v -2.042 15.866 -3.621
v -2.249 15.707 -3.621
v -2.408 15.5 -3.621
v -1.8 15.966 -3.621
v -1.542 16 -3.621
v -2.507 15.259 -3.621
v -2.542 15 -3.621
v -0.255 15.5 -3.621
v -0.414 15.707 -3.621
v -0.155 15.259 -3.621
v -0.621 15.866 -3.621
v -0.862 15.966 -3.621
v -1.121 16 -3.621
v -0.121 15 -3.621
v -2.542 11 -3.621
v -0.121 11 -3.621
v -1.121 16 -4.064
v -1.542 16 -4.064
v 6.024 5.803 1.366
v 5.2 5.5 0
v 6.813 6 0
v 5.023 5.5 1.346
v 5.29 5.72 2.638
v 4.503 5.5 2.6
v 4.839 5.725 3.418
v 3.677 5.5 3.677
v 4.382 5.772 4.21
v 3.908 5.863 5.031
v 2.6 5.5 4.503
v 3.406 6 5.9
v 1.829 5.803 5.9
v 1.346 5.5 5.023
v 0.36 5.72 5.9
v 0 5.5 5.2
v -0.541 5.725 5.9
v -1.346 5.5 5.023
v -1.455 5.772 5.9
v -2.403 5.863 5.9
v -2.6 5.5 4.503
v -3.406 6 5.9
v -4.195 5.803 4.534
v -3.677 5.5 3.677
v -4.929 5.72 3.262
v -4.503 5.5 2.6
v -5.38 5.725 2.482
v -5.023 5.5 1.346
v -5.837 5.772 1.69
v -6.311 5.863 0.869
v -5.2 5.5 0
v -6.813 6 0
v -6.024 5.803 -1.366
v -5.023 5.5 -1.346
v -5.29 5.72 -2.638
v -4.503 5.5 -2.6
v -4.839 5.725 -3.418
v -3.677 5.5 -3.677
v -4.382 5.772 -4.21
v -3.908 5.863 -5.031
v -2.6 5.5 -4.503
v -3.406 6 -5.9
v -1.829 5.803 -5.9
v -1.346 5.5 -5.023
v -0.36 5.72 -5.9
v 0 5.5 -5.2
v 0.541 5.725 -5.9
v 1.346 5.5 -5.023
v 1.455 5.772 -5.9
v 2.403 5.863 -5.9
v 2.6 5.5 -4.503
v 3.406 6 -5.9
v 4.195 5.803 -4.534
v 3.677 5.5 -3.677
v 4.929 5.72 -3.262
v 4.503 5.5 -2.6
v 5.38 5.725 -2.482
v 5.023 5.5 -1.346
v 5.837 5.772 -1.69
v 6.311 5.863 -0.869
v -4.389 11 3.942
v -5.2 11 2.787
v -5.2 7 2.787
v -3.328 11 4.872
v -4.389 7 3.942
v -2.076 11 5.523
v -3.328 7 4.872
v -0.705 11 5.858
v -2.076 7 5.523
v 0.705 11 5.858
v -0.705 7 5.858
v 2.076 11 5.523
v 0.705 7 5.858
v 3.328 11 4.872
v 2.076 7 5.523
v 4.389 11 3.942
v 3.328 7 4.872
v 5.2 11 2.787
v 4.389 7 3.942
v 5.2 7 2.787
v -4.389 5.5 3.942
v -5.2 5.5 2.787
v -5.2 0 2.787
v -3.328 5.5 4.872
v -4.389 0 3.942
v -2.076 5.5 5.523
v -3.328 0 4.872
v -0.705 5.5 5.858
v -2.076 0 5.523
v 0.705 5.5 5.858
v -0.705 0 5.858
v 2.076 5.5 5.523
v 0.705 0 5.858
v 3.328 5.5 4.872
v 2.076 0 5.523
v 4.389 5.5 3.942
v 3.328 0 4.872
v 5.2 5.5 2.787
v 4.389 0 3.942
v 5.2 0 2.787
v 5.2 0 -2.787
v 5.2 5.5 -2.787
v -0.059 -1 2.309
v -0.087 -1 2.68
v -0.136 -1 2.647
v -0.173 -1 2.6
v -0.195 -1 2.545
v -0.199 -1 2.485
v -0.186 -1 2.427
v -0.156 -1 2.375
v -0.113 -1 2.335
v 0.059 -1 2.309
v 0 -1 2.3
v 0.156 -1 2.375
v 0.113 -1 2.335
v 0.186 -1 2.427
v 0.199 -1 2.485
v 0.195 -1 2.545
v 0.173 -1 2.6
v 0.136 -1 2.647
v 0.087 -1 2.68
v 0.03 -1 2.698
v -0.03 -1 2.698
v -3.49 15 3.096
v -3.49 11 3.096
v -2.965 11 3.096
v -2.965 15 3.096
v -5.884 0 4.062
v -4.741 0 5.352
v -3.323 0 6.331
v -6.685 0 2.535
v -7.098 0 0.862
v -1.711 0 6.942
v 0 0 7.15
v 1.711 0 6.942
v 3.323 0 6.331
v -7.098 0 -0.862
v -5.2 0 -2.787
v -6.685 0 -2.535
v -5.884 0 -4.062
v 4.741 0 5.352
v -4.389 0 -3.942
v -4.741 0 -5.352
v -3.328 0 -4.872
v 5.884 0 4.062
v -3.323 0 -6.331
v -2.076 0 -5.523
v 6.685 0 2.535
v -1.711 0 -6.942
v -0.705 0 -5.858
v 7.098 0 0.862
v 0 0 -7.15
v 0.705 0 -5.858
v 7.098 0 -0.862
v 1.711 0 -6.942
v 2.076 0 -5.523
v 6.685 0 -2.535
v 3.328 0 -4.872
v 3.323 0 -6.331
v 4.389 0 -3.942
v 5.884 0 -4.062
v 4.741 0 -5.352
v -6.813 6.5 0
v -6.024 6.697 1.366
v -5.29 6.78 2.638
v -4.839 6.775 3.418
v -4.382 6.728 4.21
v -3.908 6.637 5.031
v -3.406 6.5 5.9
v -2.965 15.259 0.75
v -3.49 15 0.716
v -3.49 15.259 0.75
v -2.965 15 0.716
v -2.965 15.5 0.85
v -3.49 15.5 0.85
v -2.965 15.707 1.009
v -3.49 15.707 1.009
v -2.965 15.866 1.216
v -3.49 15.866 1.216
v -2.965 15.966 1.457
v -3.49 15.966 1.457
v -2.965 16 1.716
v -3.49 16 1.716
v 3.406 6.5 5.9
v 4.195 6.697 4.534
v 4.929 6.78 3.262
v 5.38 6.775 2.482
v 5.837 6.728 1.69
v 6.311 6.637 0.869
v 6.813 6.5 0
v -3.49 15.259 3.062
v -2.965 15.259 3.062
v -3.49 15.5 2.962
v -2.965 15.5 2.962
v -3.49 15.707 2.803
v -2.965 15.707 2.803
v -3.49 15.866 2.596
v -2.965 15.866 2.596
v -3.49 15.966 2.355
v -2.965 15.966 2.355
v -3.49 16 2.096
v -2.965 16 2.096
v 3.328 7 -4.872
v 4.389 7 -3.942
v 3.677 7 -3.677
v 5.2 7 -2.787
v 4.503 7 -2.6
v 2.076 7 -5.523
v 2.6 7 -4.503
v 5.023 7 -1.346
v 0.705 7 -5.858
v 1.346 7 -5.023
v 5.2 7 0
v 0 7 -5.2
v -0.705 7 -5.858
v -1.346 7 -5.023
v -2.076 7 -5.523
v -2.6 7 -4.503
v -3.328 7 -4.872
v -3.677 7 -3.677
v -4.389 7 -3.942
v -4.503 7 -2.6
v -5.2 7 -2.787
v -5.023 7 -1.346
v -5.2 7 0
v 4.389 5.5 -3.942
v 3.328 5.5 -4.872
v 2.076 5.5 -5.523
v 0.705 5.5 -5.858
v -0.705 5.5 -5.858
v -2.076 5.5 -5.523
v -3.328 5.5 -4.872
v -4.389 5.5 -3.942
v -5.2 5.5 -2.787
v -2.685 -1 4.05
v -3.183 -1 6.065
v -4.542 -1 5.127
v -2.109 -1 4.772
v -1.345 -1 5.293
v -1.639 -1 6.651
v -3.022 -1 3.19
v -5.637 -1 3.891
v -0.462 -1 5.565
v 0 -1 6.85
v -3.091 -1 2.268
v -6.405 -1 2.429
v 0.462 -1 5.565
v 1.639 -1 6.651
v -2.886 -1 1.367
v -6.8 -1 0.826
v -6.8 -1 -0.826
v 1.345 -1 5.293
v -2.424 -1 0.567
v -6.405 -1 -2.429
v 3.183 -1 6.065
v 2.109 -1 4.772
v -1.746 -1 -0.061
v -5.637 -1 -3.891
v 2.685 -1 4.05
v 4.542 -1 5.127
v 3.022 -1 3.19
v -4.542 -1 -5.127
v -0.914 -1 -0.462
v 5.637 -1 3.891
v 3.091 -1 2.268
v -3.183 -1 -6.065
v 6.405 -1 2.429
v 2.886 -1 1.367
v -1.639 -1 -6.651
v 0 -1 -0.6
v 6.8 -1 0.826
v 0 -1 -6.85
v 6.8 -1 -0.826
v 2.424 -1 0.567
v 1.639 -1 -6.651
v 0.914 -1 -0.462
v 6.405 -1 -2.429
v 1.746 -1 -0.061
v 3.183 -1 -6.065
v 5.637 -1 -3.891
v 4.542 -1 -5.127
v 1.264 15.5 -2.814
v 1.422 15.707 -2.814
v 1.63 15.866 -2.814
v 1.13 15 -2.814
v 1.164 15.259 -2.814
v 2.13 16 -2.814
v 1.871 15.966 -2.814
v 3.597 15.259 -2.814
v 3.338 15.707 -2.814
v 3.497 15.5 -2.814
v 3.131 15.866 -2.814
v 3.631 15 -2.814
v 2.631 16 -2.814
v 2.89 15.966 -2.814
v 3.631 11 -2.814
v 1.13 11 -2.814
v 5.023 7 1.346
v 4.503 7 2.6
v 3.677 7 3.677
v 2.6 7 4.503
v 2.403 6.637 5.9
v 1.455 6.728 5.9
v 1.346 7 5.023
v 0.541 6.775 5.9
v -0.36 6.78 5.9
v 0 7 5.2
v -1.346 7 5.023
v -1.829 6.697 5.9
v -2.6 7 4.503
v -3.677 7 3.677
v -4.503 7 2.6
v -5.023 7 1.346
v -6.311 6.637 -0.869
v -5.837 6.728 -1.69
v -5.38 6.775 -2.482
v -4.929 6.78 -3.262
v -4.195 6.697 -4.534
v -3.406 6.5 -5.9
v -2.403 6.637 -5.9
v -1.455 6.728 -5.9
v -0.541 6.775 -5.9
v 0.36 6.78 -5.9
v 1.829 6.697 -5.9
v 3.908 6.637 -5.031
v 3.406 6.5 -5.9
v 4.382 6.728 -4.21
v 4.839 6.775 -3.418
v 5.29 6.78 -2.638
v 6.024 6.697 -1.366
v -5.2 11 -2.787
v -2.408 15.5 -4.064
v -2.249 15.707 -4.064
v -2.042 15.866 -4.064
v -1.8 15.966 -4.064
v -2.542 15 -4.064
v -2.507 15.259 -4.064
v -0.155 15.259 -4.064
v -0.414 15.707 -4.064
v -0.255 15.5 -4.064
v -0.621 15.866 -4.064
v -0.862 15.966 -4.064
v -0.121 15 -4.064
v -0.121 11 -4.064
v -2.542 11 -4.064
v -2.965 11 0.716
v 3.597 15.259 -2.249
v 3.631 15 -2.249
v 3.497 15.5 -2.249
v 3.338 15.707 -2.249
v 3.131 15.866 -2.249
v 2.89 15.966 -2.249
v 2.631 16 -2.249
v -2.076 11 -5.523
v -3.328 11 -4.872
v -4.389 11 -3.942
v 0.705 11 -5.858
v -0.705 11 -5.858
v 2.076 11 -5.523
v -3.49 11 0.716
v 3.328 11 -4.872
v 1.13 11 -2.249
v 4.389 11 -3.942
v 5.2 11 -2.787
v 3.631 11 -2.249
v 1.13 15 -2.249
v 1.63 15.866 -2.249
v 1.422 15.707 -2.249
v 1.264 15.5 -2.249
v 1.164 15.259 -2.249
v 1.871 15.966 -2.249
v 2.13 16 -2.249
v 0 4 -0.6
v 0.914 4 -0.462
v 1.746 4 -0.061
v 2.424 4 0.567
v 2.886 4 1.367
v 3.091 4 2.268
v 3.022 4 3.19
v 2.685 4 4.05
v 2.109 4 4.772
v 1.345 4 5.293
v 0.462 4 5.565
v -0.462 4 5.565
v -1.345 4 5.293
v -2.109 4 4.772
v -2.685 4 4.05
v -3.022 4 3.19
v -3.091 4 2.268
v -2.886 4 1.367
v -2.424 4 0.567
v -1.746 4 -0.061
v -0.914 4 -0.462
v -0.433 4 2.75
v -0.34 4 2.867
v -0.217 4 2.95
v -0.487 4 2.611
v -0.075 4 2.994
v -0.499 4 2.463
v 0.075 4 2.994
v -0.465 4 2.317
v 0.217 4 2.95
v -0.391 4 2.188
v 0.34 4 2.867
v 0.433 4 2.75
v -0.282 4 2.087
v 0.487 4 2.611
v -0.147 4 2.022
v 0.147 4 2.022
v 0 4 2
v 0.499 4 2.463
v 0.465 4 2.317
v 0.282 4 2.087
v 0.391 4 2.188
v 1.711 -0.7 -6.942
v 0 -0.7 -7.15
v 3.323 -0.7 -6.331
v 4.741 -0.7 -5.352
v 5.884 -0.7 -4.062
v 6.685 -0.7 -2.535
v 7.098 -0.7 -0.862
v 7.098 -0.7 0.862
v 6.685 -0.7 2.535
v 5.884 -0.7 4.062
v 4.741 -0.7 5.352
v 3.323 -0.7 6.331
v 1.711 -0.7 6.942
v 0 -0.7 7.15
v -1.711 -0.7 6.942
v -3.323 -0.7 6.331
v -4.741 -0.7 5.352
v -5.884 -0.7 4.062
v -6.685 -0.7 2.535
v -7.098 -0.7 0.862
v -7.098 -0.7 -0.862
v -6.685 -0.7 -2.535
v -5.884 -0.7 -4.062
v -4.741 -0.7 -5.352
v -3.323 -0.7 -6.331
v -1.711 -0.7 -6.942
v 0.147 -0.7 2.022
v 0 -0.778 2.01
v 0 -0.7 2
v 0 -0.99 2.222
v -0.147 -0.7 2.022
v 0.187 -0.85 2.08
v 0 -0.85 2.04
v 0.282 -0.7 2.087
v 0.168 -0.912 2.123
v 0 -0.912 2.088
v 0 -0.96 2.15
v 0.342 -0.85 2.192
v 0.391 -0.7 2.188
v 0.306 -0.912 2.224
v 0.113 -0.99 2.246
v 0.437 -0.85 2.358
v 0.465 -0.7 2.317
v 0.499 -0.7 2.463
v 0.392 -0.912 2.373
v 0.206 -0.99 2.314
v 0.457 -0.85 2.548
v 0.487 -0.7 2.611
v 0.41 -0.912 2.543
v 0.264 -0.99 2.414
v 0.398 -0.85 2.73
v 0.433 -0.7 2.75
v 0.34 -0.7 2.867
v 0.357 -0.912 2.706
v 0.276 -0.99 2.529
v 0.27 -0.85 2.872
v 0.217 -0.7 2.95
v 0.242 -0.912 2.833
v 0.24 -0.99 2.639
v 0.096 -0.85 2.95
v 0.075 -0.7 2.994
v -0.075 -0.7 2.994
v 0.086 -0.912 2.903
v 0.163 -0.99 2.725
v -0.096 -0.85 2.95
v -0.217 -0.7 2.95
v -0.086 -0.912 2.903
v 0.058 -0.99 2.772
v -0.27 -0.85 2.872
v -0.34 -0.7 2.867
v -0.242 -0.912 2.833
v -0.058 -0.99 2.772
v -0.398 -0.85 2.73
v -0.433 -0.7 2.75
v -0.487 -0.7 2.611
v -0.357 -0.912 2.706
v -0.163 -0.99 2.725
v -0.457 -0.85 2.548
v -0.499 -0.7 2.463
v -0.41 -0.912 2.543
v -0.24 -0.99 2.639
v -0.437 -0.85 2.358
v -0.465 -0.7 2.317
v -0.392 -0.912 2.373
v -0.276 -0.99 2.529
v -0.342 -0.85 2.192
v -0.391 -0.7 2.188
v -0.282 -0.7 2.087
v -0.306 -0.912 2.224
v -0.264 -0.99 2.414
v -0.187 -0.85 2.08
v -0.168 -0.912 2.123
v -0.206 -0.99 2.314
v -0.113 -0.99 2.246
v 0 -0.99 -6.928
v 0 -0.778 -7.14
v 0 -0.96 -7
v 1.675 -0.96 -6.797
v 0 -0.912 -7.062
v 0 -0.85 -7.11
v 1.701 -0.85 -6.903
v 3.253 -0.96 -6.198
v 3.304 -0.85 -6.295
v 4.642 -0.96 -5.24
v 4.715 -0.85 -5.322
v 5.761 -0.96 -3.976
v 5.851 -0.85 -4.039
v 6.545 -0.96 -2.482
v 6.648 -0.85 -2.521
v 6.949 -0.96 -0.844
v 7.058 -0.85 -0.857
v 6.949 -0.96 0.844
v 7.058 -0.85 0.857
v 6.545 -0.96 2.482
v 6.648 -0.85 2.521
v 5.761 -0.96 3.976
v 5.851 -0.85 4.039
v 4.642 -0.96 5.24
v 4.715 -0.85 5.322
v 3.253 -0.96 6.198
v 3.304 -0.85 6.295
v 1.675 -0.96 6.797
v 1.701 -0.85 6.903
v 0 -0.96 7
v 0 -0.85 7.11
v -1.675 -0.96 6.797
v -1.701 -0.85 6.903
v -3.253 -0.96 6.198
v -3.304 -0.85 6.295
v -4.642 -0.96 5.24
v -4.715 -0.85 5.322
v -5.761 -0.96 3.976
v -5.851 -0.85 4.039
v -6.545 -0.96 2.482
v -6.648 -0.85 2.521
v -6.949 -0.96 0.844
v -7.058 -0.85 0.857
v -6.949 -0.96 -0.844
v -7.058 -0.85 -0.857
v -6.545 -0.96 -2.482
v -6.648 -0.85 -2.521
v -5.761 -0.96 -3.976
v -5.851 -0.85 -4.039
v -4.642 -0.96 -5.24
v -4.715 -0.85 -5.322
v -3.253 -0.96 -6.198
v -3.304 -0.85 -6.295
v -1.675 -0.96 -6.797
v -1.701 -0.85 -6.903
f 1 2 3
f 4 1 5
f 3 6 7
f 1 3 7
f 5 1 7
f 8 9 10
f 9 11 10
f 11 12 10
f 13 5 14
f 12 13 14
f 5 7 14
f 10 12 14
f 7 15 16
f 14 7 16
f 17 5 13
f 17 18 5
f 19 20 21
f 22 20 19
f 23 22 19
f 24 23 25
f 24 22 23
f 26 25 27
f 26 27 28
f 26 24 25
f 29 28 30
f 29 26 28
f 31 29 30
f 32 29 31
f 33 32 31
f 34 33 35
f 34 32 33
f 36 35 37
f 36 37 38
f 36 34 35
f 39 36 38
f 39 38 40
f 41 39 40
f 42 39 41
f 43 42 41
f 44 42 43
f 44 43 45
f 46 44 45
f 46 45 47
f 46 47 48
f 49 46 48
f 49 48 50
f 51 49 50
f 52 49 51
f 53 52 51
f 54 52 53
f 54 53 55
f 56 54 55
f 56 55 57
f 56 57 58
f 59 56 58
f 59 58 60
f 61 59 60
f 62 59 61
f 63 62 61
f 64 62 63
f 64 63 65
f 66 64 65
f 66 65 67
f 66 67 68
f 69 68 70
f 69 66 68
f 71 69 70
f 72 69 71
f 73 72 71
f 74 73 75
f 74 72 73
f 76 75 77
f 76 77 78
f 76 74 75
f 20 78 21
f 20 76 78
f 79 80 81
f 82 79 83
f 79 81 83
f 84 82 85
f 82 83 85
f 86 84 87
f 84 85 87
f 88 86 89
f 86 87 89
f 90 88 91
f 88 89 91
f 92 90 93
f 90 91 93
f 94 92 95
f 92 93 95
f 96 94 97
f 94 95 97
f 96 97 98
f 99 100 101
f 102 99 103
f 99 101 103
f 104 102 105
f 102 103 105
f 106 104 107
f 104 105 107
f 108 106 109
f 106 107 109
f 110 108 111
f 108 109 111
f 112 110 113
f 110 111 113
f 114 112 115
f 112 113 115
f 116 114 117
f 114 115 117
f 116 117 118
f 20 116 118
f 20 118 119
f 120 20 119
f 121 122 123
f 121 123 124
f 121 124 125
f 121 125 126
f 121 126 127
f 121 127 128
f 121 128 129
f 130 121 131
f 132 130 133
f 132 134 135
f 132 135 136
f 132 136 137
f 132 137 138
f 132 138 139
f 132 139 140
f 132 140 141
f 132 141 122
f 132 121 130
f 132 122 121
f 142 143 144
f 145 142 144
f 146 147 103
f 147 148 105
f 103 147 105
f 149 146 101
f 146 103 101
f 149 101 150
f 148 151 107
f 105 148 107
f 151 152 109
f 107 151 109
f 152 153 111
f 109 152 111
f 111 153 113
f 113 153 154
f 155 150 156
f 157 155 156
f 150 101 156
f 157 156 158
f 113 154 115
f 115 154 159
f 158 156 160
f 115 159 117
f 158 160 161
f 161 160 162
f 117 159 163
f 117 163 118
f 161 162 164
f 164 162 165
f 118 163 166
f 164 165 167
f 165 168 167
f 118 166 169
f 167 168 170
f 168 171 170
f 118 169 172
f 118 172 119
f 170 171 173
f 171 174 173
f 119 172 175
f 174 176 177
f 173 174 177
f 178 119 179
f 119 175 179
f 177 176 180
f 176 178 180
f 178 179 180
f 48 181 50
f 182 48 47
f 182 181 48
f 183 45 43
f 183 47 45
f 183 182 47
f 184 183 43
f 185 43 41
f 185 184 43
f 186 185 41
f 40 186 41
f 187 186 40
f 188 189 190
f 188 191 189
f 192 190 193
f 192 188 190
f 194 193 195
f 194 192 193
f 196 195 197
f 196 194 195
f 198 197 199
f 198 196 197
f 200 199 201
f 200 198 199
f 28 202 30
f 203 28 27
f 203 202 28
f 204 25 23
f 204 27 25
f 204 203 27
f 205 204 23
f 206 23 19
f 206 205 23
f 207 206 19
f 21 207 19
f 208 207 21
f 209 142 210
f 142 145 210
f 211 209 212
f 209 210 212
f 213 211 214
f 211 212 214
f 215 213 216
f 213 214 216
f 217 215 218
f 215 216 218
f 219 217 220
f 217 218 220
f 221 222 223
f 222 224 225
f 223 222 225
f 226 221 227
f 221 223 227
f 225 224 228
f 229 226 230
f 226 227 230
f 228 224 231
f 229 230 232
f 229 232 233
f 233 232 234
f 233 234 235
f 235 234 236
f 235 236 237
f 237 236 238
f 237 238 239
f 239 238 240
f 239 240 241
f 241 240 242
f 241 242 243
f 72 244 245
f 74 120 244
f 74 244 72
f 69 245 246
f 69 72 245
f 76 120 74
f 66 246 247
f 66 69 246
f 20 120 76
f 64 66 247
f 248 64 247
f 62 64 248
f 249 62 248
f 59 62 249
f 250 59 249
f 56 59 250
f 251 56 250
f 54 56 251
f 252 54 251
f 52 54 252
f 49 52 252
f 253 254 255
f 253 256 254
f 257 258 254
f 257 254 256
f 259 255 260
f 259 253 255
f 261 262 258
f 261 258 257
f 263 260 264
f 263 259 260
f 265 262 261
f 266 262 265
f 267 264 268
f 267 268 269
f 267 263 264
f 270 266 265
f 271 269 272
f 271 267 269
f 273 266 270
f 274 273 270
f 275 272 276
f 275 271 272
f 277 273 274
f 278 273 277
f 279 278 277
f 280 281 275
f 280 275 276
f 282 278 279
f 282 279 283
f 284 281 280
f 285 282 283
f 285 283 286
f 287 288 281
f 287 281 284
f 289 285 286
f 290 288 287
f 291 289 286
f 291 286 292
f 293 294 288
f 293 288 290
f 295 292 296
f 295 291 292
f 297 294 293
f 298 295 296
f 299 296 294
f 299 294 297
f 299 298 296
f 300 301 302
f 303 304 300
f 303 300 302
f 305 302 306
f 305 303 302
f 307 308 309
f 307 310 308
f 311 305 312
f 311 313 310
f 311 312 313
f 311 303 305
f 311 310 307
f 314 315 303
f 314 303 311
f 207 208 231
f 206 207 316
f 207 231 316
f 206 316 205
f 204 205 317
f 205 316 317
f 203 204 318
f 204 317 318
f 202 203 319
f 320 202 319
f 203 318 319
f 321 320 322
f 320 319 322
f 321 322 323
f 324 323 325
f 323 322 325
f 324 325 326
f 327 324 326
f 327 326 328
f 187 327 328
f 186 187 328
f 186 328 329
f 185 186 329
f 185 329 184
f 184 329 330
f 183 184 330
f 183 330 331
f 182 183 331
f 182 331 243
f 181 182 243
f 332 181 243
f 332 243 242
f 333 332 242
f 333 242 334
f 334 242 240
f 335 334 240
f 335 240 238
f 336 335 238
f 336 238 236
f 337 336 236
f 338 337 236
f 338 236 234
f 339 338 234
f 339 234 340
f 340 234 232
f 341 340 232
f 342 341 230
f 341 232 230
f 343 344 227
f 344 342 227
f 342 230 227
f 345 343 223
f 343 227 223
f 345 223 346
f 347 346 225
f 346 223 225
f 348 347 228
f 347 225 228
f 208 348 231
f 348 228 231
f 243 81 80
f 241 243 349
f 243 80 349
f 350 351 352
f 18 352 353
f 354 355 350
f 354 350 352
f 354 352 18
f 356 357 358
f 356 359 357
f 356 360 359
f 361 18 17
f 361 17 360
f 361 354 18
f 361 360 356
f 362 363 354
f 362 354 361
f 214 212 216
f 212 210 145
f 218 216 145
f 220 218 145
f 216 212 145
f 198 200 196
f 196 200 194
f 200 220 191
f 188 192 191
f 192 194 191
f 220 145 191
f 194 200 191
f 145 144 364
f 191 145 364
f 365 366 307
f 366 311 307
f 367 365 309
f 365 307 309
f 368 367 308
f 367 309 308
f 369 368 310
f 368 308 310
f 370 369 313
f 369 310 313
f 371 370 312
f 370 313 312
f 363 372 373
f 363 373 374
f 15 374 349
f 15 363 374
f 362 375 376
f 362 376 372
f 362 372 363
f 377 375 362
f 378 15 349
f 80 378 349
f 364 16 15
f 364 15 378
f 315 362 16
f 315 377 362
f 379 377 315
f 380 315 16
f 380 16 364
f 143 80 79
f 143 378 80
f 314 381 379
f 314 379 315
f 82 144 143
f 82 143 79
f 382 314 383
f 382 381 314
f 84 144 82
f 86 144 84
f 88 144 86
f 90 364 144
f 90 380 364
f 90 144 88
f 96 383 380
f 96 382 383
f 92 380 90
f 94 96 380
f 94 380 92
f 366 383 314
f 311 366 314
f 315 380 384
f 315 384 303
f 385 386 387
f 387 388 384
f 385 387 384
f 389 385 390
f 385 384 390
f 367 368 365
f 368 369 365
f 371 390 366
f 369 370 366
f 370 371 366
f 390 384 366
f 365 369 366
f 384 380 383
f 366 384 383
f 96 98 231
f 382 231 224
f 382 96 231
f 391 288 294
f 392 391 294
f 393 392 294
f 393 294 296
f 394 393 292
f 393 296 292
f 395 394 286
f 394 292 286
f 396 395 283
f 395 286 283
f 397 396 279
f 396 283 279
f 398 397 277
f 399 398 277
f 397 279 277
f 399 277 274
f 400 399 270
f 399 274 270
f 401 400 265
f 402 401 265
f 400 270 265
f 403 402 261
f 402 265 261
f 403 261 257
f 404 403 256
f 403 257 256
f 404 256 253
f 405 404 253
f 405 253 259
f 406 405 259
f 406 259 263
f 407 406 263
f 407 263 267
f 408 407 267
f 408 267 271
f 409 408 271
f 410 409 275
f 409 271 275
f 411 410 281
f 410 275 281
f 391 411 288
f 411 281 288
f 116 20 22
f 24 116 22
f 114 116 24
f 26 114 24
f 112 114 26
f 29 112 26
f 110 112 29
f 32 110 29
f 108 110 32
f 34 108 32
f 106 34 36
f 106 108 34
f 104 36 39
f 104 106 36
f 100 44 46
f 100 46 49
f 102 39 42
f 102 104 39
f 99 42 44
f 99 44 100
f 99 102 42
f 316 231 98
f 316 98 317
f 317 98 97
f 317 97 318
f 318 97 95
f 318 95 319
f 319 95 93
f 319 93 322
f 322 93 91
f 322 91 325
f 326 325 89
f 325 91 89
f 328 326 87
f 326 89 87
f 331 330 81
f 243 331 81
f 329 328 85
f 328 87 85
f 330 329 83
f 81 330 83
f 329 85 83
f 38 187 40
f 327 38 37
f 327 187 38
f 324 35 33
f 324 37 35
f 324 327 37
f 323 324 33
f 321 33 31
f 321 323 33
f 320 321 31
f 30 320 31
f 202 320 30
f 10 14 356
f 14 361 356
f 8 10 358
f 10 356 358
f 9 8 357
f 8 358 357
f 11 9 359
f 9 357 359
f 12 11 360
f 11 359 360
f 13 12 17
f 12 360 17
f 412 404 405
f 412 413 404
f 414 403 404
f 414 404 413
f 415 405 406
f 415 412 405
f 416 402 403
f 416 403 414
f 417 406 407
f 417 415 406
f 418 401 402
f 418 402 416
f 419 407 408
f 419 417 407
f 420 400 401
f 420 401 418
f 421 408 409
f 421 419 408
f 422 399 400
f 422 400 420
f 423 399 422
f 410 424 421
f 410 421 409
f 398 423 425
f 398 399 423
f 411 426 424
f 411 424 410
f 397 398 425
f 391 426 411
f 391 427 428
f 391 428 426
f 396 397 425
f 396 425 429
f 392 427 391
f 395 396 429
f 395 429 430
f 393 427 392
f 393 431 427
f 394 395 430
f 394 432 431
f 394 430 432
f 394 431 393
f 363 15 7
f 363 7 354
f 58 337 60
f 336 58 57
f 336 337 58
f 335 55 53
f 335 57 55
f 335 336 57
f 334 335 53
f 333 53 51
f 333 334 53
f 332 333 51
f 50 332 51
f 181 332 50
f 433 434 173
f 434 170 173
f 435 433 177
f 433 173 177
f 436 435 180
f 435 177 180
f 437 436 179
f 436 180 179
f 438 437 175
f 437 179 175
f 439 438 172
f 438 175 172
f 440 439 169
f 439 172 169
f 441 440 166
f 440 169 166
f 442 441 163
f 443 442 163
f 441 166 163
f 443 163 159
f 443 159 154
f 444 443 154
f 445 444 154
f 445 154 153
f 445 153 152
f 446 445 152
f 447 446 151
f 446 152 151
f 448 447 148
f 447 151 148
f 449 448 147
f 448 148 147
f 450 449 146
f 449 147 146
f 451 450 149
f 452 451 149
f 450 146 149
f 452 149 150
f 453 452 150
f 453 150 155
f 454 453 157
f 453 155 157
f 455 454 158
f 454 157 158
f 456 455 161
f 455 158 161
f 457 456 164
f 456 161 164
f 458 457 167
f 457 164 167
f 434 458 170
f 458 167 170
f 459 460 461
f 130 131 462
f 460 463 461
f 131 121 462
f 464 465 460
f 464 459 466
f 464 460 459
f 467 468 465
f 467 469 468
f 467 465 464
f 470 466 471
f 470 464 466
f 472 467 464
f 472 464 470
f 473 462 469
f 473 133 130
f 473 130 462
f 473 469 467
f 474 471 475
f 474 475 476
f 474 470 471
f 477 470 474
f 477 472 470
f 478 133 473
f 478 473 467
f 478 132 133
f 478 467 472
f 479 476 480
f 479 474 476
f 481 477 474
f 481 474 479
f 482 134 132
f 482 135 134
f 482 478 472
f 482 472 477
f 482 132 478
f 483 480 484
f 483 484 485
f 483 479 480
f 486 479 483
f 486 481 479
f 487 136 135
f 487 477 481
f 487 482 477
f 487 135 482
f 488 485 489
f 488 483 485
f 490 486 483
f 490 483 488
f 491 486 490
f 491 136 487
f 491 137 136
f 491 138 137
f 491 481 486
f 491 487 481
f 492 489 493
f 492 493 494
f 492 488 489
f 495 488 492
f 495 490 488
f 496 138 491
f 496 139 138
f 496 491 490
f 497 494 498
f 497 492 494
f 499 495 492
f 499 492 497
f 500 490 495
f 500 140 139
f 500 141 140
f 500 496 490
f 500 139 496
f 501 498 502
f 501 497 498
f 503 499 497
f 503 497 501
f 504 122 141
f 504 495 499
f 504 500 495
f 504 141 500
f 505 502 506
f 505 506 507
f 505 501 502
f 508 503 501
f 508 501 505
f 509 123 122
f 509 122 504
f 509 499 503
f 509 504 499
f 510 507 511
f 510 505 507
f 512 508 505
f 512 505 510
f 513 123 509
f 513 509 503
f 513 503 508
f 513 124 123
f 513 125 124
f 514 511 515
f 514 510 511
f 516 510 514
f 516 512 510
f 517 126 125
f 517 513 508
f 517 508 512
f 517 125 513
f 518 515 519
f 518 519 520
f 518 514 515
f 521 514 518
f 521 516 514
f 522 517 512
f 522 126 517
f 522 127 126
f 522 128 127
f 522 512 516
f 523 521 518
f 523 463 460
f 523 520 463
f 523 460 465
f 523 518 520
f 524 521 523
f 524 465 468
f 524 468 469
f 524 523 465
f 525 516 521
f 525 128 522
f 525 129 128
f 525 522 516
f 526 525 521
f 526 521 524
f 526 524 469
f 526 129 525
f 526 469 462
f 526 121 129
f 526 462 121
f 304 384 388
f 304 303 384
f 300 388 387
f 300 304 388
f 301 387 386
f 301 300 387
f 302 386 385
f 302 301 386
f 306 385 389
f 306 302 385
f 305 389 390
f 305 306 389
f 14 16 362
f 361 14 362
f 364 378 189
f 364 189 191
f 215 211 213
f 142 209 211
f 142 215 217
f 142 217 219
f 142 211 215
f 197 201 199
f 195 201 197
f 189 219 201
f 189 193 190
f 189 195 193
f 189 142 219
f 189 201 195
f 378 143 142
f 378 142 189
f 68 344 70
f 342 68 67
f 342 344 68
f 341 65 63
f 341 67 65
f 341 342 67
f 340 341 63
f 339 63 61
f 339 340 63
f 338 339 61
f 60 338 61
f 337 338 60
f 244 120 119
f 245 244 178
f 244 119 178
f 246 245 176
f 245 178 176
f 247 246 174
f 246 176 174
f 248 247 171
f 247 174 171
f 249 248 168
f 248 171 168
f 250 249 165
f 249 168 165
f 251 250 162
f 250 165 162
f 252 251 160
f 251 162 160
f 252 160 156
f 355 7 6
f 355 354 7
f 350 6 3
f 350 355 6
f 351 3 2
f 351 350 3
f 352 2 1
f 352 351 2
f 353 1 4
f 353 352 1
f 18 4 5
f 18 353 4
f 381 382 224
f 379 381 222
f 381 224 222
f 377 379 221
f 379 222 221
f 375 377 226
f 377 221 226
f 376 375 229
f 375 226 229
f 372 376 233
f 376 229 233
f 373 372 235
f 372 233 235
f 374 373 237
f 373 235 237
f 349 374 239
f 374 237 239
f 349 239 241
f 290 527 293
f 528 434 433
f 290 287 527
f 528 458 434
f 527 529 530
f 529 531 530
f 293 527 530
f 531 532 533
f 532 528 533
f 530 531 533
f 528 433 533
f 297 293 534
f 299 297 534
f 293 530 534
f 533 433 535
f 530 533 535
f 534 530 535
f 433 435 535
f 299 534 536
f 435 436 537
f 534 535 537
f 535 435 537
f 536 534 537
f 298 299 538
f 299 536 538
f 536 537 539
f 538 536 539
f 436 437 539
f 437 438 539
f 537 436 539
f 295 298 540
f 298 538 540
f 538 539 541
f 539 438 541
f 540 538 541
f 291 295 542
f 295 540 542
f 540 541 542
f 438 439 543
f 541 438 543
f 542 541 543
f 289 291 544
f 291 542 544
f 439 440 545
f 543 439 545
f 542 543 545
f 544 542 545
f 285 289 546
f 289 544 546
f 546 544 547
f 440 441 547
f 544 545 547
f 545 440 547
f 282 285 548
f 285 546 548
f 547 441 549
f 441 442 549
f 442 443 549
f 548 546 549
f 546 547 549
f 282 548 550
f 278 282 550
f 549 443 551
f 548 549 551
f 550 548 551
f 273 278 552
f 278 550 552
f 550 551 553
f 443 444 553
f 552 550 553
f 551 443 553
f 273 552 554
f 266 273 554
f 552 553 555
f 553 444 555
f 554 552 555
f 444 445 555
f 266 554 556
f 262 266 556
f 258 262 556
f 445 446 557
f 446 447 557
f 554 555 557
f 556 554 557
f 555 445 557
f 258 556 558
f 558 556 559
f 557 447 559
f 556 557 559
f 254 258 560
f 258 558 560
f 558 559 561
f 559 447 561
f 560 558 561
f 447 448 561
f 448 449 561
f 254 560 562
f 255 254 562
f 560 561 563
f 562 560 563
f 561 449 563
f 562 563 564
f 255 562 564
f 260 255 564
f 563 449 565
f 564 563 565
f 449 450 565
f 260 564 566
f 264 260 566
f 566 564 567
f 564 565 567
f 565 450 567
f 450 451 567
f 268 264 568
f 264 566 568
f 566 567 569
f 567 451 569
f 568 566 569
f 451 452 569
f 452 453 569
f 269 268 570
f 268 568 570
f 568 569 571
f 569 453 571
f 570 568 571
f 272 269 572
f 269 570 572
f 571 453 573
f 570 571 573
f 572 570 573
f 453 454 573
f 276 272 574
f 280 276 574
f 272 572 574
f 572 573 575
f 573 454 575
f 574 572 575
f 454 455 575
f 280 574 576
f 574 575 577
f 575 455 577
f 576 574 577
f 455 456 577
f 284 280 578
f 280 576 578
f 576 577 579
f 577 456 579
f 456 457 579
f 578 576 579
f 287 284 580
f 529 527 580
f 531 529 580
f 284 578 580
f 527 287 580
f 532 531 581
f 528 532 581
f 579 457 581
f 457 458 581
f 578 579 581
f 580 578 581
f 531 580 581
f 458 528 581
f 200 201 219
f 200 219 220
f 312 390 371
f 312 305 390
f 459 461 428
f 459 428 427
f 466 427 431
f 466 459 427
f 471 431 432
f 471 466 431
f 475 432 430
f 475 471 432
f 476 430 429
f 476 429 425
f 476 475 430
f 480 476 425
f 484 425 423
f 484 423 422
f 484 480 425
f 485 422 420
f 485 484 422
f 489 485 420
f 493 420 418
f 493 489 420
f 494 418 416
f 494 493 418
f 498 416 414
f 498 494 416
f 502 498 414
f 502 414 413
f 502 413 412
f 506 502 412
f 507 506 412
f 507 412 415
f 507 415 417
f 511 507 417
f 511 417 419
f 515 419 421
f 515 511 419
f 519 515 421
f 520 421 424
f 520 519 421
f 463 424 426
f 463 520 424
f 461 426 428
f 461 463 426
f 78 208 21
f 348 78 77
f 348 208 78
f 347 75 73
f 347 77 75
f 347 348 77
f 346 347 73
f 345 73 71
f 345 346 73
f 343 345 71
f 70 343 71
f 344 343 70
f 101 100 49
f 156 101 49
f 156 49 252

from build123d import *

# Parameters (mm, degrees)
SKETCH_2_R          = 5.9
EXTRUDE_1_DEPTH     = 11
SKETCH_3_R          = 7.15
EXTRUDE_2_DEPTH     = 1
SKETCH_4_R          = 3.1
SKETCH_4_R_2        = 0.5
CUT_EXTRUDE_1_DEPTH = 5
FILLET_1_R          = 0.3
FILLET_2_R          = 0.3
SKETCH_5_W          = 16.4
SKETCH_5_H          = 21
SKETCH_5_W_2        = 10.4
SKETCH_5_H_2        = 15
CUT_EXTRUDE_2_DEPTH = 11
SKETCH_6_W          = 2.420538387
SKETCH_6_H          = 0.443765371
SKETCH_6_W_2        = 2.501222999
SKETCH_6_H_2        = 0.56479229
SKETCH_6_W_3        = 0.524449984
SKETCH_6_H_3        = 2.38019608
EXTRUDE_3_DEPTH     = 5
FILLET_3_R          = 1
EXTRUDE_START       = -4
EXTRUDE_4_DEPTH     = 1.5


with BuildPart() as part:
    # 草图2 → 凸台-拉伸1 (new body)
    with BuildSketch(Plane(origin=(0, 0, 0), x_dir=(1, 0, 0), z_dir=(0, 1, 0))):
        with Locations(Location((0, 0, 0), (0, 0, 270))):
            Circle(SKETCH_2_R)
    extrude(amount=EXTRUDE_1_DEPTH)

    # 草图3 → 凸台-拉伸2 (add)
    with BuildSketch(Plane.XZ):
        with Locations(Location((0, 0, 0), (0, 0, 270))):
            Circle(SKETCH_3_R)
    extrude(amount=EXTRUDE_2_DEPTH)

    # 草图4 → 切除-拉伸1 (cut)
    with BuildSketch(Plane.XZ.offset(1)):
        with Locations(Location((0, 2.5, 0), (0, 0, 270))):
            Circle(SKETCH_4_R)
        with Locations(Location((0, 2.5, 0), (0, 0, 270))):
            Circle(SKETCH_4_R_2, mode=Mode.SUBTRACT)
    extrude(amount=-CUT_EXTRUDE_1_DEPTH, mode=Mode.SUBTRACT)

    # 圆角1
    fillet_1_edges = [part.edges().sort_by_distance(p)[0] for p in [
        (0, -1, 3),
    ]]
    fillet(fillet_1_edges, radius=FILLET_1_R)

    # 圆角2
    fillet_2_edges = [part.edges().sort_by_distance(p)[0] for p in [
        (0, -1, 7.15),
    ]]
    fillet(fillet_2_edges, radius=FILLET_2_R)

    # 草图5 → 切除-拉伸2 (cut)
    with BuildSketch(Plane(origin=(0, 11, 0), x_dir=(1, 0, 0), z_dir=(0, 1, 0))):
        Rectangle(SKETCH_5_W, SKETCH_5_H)
        Rectangle(SKETCH_5_W_2, SKETCH_5_H_2, mode=Mode.SUBTRACT)
    extrude(amount=-CUT_EXTRUDE_2_DEPTH, mode=Mode.SUBTRACT)

    # 草图6 → 凸台-拉伸3 (add)
    with BuildSketch(Plane(origin=(0, 11, 0), x_dir=(1, 0, 0), z_dir=(0, 1, 0))):
        with Locations((-1.331296113, 3.842604689)):
            Rectangle(SKETCH_6_W, SKETCH_6_H)
        with Locations((2.38019608, 2.531479729)):
            Rectangle(SKETCH_6_W_2, SKETCH_6_H_2)
        with Locations((-3.227384515, -1.906173979)):
            Rectangle(SKETCH_6_W_3, SKETCH_6_H_3)
    extrude(amount=EXTRUDE_3_DEPTH)

    # 圆角3
    fillet_3_edges = [part.edges().sort_by_distance(p)[0] for p in [
        (-0.121026919, 16, -3.842604688),
        (-2.541565306, 16, -3.842604688),
        (3.630807579, 16, -2.531479729),
        (1.12958458, 16, -2.531479729),
        (-3.227384515, 16, 0.716075939),
        (-3.227384515, 16, 3.096272019),
    ]]
    fillet(fillet_3_edges, radius=FILLET_3_R)

    # 草图7 → 凸台-拉伸4 (add)
    with BuildSketch(Plane(origin=(0, 11, 0), x_dir=(1, 0, 0), z_dir=(0, 1, 0)).offset(EXTRUDE_START)):
        Polygon((-3.406366588, 5.9), (-6.812733176, 0), (-3.406366588, -5.9), (3.406366588, -5.9), (6.812733176, 0), (3.406366588, 5.9), align=None)
    extrude(amount=-EXTRUDE_4_DEPTH)

    # 草图8 → 切除-旋转1 (revolve, cut)
    with BuildSketch(Plane.XY, mode=Mode.PRIVATE) as cut_revolve_1_sk:
        Polygon((-6.812733176, 7), (-6.812733176, 6.5), (-5.2, 7), align=None)
        Polygon((-5.2, 5.5), (-6.812733176, 5.5), (-6.812733176, 6), align=None)
    revolve(cut_revolve_1_sk.sketch.rotate(Axis((0, 11, 0), (0, -1, 0)), 180.000000014), axis=Axis((0, 11, 0), (0, -1, 0)), mode=Mode.SUBTRACT)


solid = part.part
